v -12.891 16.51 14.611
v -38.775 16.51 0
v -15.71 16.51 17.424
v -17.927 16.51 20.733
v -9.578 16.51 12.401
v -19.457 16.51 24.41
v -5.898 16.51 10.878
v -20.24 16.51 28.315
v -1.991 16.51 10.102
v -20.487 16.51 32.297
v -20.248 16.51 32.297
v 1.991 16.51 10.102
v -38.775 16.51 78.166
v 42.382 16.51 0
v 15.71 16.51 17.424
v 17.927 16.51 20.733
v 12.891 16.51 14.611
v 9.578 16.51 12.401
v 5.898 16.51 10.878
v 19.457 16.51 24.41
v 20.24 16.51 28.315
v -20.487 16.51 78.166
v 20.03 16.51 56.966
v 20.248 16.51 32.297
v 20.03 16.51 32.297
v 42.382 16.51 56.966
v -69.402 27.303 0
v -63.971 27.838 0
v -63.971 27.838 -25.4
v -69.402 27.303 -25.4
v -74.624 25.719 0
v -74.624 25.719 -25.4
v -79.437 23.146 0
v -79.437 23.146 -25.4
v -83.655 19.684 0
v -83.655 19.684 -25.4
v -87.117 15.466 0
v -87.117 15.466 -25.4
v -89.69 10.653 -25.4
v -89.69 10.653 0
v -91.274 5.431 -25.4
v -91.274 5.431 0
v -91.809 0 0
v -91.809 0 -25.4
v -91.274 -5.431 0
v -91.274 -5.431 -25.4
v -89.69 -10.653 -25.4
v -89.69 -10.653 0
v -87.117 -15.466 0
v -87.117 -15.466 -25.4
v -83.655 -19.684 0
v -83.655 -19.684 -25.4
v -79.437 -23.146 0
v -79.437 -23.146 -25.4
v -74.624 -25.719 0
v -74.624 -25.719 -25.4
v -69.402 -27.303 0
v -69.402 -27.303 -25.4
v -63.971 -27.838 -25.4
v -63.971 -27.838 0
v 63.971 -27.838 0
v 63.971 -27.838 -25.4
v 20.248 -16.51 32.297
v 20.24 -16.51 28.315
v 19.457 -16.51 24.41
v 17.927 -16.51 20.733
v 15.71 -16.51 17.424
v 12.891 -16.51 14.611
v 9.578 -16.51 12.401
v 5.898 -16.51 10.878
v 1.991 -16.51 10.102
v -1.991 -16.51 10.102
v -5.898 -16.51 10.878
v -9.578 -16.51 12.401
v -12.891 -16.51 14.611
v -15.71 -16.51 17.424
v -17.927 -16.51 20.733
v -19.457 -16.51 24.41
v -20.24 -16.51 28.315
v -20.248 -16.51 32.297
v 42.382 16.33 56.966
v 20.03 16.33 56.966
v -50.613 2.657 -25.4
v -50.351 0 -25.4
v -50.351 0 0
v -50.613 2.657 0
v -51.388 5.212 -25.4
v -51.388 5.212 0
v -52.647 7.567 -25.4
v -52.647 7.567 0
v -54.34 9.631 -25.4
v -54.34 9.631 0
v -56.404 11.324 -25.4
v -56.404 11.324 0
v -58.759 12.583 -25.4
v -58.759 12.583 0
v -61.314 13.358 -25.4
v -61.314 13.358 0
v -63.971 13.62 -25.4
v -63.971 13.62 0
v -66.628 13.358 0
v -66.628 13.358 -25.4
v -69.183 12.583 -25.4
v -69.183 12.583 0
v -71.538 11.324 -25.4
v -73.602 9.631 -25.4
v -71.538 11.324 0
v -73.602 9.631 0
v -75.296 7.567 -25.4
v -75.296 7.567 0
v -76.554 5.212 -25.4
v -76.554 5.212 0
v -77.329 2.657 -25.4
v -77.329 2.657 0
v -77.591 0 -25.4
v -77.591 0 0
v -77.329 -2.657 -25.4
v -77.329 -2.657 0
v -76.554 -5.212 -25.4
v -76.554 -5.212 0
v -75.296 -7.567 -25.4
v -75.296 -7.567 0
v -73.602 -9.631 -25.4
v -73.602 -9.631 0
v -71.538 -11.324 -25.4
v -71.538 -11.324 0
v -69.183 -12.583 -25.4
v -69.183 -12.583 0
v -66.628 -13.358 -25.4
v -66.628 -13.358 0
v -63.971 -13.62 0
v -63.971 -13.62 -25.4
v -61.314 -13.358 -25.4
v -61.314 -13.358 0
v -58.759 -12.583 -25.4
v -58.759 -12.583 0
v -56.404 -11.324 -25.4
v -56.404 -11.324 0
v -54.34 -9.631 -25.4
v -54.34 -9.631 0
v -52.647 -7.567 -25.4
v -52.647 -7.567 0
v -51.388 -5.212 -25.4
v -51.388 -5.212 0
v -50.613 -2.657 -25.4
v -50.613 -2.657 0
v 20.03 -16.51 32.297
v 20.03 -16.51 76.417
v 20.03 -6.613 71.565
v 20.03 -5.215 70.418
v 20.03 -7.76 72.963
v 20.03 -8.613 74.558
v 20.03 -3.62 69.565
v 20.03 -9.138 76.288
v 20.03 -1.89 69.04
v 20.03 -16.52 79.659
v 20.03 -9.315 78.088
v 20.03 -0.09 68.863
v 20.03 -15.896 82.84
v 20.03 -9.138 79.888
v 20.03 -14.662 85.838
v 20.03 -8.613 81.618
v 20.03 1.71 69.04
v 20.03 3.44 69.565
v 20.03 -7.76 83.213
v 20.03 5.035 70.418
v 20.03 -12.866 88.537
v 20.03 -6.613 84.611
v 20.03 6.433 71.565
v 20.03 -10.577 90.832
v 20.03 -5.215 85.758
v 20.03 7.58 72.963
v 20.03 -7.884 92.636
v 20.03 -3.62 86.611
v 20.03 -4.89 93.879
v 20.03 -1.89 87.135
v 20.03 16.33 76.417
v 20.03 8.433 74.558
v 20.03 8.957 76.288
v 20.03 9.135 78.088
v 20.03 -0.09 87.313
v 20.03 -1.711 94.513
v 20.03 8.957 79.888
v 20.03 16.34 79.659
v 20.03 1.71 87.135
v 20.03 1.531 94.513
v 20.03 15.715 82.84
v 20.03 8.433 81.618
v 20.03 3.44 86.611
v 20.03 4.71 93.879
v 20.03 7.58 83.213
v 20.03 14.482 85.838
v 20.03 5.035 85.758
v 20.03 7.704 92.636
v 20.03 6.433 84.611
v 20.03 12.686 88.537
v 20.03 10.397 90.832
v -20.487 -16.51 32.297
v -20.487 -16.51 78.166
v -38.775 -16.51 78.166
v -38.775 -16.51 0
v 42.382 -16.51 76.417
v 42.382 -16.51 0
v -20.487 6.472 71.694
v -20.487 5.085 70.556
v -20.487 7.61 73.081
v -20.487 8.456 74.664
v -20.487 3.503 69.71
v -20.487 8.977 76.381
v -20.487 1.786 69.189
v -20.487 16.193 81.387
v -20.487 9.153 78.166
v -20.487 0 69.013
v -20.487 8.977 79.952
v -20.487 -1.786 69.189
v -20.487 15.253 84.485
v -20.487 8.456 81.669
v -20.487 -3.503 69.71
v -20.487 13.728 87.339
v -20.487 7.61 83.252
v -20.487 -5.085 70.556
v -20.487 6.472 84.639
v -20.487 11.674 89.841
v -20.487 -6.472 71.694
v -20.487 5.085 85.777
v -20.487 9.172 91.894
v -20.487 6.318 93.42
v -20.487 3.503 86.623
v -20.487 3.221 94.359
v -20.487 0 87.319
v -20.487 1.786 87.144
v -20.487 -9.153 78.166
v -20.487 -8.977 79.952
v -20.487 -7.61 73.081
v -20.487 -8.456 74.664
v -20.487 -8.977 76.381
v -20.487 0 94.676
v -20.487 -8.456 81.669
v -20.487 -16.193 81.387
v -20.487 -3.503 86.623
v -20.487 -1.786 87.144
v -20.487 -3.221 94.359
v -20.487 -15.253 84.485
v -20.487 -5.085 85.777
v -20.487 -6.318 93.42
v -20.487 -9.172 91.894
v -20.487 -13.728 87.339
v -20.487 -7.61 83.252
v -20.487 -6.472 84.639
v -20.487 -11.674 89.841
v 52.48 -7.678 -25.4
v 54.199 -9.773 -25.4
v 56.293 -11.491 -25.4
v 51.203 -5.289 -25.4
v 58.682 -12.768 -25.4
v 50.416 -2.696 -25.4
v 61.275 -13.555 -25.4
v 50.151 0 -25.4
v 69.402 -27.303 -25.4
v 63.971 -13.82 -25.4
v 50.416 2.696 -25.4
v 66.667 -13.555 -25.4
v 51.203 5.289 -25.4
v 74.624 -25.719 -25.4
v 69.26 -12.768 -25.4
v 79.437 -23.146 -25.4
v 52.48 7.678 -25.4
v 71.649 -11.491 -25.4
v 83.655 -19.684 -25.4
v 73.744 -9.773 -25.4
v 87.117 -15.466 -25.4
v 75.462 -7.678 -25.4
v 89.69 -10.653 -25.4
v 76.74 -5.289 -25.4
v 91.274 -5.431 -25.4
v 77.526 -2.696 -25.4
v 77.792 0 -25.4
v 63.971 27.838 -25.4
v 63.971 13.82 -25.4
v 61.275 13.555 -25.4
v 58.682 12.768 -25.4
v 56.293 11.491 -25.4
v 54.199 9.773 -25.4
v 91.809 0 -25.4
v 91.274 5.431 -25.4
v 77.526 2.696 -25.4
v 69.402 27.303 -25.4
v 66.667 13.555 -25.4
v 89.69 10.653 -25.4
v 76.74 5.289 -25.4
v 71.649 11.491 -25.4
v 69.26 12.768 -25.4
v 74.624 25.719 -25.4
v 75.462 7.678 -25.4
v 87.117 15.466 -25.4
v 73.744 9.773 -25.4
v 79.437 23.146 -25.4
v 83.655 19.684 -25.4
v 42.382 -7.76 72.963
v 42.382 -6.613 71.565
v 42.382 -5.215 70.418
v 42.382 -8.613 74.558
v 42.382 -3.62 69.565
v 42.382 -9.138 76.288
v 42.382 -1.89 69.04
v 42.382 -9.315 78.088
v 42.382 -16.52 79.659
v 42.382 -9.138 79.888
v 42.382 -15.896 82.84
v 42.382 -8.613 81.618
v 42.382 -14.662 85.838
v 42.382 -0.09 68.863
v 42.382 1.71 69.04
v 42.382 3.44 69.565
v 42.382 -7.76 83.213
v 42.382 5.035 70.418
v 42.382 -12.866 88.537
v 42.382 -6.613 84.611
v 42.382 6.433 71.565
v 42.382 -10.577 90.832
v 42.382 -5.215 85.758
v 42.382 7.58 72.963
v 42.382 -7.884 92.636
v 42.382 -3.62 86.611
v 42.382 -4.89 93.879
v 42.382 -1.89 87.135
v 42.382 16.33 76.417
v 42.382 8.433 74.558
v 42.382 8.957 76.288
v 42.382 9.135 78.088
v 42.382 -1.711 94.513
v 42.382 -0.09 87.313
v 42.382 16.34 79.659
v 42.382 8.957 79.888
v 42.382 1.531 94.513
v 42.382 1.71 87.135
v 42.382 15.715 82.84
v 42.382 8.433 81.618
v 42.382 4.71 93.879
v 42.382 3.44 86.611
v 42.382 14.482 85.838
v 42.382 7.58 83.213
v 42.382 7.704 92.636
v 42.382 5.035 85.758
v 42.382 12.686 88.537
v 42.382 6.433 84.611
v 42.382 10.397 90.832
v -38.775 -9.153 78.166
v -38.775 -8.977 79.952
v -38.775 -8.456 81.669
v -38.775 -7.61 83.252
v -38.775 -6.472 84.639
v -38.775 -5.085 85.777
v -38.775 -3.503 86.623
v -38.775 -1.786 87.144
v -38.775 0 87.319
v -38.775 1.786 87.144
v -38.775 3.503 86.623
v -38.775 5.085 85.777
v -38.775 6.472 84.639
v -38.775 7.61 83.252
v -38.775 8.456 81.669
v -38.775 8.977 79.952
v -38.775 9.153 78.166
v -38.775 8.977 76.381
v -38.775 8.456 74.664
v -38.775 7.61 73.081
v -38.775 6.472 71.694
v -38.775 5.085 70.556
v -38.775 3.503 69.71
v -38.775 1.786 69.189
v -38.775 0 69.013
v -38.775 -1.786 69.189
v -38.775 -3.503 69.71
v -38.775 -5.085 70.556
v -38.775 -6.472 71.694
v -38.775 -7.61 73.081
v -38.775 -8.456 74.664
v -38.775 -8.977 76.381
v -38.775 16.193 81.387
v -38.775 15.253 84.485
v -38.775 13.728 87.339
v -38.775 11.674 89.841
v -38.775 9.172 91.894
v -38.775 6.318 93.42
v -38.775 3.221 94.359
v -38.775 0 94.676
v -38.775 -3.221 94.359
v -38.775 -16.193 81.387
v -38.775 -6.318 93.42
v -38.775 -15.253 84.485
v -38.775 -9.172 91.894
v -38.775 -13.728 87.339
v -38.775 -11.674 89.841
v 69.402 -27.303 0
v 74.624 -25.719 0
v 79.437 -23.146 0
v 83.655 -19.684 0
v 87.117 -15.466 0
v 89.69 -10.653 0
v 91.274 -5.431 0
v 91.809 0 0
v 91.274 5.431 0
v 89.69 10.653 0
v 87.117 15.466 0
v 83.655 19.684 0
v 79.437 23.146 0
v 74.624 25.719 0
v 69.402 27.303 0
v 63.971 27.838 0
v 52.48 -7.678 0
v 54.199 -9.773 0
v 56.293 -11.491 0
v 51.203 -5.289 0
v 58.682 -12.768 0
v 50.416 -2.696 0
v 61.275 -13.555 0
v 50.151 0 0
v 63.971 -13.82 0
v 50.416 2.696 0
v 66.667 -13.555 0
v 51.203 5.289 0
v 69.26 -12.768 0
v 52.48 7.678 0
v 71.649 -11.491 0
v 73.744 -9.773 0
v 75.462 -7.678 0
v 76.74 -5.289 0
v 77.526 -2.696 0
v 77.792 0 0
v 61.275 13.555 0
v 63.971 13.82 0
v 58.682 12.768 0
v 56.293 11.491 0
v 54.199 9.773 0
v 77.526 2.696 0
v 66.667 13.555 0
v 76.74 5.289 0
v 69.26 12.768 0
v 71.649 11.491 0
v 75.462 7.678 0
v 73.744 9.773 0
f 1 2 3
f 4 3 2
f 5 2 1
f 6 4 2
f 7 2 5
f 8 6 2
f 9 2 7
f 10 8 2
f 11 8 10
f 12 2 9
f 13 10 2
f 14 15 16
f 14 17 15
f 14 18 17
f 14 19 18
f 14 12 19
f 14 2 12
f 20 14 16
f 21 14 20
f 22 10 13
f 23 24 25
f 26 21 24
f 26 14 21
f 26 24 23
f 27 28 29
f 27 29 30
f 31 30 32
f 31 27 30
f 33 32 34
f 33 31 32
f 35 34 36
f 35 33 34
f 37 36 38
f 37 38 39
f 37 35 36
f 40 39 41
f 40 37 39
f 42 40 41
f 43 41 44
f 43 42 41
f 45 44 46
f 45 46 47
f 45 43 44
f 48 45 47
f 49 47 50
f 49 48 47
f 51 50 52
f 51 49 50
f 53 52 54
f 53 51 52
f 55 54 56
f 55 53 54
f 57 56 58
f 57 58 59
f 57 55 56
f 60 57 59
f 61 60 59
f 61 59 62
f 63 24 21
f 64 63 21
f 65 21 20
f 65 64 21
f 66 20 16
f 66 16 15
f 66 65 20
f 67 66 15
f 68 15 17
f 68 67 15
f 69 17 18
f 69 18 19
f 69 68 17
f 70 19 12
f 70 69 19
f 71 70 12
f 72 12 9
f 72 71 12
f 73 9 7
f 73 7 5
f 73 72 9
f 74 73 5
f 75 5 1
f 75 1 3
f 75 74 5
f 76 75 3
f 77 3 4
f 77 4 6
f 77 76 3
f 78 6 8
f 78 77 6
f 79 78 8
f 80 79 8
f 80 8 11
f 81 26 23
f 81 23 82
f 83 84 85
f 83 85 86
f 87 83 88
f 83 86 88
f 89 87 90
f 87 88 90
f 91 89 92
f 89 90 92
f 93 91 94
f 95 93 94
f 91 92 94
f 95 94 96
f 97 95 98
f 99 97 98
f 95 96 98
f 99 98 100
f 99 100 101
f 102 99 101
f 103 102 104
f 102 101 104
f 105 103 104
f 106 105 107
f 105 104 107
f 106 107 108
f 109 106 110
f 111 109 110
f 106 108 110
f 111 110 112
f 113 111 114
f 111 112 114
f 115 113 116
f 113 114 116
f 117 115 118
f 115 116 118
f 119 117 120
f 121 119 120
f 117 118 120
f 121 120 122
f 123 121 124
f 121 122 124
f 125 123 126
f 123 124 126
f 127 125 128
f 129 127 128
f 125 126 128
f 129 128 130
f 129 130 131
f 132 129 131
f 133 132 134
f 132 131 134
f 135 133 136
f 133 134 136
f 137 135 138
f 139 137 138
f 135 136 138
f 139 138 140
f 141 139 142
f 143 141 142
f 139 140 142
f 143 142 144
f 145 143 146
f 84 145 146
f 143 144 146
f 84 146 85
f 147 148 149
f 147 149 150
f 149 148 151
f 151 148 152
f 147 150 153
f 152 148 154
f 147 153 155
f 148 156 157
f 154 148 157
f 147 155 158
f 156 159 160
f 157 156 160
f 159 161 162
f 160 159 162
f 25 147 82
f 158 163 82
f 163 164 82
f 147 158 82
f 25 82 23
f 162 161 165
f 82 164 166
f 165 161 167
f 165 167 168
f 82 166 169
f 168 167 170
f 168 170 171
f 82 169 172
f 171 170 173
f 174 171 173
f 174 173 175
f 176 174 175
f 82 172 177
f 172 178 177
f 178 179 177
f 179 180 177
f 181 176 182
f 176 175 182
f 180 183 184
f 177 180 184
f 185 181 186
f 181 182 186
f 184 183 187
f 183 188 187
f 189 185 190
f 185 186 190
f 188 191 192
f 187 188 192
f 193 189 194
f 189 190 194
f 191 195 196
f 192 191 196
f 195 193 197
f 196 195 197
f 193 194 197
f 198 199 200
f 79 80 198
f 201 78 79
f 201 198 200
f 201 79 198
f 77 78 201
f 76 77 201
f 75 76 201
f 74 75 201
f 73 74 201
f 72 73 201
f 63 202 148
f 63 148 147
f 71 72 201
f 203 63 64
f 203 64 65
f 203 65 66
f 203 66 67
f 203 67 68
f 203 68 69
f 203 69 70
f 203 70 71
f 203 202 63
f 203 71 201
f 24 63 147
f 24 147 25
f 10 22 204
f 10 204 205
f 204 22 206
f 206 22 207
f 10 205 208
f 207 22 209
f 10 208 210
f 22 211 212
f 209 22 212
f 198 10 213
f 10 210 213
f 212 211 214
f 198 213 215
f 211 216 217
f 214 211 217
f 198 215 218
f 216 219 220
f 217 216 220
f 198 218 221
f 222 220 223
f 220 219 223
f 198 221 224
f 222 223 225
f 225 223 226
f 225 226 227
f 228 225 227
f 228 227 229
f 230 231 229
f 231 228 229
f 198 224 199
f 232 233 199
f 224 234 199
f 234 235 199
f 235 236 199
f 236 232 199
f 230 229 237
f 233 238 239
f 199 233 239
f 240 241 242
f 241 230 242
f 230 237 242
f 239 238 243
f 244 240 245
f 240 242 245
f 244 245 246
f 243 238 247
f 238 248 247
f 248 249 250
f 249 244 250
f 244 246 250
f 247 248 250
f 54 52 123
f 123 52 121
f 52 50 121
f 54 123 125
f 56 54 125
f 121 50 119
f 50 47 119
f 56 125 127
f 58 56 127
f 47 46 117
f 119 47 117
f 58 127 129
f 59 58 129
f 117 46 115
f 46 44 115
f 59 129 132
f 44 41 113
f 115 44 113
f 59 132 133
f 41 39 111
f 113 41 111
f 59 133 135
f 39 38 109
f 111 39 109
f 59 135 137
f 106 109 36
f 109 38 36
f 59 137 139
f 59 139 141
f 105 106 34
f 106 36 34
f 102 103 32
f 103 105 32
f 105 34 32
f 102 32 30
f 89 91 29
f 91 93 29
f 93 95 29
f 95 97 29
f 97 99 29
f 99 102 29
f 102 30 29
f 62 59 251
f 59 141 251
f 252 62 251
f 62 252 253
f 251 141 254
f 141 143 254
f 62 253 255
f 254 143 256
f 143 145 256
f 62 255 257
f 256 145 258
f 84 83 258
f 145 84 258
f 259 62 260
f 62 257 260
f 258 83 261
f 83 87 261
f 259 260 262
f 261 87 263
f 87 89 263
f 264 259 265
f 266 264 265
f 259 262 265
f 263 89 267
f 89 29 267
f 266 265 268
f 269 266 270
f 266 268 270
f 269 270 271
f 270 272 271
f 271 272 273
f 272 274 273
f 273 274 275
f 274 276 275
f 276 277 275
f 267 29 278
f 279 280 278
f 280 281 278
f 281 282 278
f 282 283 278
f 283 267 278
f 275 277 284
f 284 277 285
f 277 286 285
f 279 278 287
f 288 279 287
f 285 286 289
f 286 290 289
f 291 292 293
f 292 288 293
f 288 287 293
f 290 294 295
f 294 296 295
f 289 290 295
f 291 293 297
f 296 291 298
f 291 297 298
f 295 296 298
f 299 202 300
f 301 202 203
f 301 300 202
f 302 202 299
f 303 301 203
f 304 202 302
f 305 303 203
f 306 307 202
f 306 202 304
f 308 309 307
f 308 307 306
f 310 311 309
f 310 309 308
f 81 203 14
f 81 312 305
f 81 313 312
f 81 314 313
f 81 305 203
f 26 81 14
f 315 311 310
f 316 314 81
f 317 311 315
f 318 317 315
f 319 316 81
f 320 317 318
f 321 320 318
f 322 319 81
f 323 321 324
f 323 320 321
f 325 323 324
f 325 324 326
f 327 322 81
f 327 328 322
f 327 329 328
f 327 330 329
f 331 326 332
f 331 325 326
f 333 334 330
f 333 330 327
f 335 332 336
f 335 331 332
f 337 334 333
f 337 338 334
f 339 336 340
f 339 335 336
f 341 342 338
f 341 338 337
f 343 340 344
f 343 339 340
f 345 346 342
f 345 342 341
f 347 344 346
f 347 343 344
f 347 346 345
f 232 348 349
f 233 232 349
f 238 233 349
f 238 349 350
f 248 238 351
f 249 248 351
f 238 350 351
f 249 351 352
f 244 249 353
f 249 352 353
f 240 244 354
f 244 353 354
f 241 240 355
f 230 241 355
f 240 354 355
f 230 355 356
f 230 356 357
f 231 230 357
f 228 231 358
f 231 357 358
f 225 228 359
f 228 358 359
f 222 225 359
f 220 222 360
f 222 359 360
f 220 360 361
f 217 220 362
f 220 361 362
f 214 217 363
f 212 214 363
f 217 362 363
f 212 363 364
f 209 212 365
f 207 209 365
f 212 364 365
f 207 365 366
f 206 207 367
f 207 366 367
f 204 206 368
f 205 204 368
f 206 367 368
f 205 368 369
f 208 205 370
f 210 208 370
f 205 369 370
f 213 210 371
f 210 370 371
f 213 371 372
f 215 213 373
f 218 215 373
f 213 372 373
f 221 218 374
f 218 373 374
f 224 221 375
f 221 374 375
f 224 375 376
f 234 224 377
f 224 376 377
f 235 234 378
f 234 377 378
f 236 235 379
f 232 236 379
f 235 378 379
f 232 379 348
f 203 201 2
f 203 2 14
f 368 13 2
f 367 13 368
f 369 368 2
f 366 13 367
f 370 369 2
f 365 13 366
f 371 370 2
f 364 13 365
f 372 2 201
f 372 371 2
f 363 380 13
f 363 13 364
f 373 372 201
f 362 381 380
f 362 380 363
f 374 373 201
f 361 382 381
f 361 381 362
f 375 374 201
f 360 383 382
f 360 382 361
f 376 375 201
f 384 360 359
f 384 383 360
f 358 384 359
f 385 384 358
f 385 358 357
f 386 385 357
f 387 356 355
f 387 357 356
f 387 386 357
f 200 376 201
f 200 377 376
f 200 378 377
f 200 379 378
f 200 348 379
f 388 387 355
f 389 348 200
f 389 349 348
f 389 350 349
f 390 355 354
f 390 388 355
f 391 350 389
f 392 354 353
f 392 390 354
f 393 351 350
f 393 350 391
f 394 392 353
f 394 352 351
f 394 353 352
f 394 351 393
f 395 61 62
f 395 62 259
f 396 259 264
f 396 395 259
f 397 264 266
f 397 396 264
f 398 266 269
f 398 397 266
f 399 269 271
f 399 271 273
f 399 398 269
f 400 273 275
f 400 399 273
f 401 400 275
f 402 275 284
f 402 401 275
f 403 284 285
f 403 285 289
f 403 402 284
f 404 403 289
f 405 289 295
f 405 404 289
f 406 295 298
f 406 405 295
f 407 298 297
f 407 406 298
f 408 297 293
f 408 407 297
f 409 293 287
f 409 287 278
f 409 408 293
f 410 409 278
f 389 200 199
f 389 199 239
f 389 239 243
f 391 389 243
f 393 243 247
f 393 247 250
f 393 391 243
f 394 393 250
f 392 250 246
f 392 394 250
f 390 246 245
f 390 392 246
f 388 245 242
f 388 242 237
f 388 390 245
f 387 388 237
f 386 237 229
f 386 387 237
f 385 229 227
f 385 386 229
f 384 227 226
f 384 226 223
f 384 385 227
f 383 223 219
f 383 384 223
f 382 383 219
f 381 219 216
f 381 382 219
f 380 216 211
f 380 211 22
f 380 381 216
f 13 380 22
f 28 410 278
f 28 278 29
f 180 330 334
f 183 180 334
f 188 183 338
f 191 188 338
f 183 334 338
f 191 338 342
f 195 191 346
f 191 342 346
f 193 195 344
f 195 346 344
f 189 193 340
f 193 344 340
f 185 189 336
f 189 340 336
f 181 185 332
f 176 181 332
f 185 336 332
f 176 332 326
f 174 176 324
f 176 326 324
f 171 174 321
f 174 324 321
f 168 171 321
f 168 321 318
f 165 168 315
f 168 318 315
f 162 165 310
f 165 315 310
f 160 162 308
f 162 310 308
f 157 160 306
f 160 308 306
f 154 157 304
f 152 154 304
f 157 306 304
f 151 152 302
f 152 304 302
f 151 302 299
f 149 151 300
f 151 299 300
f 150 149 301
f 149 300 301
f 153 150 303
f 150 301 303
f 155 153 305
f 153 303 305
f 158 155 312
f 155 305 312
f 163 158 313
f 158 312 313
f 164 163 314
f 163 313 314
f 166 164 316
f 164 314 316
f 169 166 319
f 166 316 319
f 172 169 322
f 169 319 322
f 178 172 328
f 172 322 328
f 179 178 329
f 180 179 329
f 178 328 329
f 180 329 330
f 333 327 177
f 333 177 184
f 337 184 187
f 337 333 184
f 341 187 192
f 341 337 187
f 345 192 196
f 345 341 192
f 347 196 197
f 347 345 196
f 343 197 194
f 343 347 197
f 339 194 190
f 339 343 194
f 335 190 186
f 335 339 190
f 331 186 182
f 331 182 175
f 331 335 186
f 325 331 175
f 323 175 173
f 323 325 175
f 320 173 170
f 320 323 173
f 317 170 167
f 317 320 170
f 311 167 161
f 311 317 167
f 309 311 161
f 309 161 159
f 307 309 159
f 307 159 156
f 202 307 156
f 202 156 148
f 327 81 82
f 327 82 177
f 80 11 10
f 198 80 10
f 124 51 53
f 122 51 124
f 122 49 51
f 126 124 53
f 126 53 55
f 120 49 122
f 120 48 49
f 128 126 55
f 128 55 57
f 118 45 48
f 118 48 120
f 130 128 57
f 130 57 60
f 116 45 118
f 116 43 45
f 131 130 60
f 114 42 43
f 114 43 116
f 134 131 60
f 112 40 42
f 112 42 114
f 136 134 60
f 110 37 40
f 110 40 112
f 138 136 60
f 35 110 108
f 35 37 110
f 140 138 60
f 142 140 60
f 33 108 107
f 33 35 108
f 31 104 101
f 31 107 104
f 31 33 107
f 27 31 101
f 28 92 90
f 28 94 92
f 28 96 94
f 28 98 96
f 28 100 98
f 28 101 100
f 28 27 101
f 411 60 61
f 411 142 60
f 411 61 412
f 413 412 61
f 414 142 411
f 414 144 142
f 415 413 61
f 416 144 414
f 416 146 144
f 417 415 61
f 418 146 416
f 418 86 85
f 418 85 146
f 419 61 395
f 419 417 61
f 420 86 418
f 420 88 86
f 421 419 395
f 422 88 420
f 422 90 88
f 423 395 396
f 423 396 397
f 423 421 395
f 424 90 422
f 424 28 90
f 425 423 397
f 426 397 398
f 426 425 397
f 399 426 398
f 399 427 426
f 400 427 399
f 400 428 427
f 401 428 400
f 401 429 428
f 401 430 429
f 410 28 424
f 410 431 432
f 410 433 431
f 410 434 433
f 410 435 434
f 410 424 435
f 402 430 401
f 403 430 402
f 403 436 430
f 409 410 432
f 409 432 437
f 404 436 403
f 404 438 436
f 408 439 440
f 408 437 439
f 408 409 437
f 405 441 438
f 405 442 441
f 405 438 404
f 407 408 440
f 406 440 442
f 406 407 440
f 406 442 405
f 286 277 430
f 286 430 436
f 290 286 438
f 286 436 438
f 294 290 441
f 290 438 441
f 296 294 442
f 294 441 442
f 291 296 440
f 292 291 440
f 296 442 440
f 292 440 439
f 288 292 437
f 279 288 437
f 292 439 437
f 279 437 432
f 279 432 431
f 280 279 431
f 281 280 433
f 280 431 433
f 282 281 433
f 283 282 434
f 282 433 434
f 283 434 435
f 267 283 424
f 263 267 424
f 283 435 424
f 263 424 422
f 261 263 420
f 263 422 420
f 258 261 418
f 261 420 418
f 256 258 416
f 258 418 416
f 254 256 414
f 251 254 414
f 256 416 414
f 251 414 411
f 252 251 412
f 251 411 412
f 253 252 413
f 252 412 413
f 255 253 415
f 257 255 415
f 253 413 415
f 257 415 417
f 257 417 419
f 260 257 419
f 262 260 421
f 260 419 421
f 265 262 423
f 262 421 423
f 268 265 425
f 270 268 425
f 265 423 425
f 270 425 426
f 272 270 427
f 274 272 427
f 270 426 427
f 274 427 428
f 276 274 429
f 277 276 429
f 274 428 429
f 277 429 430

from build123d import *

# Parameters (mm, degrees)
F0_R     = 13.6198201134
F0_R_2   = 13.8204624453
F1_DEPTH = 25.4
F3_DEPTH = 16.51
F4_R     = 9.1529854274
F5_DEPTH = 18.288
F6_R     = 9.2248596532
F7_DEPTH = 22.352


# Not quite as in the source:
# - a feature names something its author has since deleted; it is built from what else it names


with BuildPart() as f1:
    # F0 (on Top) → F1 (new body)
    with BuildSketch(Plane.XY):
        with BuildLine():
            Line((-63.97113204, -27.8375800699), (63.97113204, -27.8375800699))
            ThreePointArc((63.97113204, -27.8375800699), (91.8087121099, 0), (63.97113204, 27.8375800699))
            Line((63.97113204, 27.8375800699), (-63.97113204, 27.8375800699))
            ThreePointArc((-63.97113204, 27.8375800699), (-91.8087121099, 0), (-63.97113204, -27.8375800699))
        make_face()
        with Locations((-63.97113204, 0)):
            Circle(F0_R, mode=Mode.SUBTRACT)
        with Locations((63.97113204, 0)):
            Circle(F0_R_2, mode=Mode.SUBTRACT)
    extrude(amount=-F1_DEPTH)


with BuildPart() as f3:
    # F2 (on Front) → F3 (new body, symmetric)
    with BuildSketch(Plane.XZ):
        with BuildLine():
            Line((-38.7753397226, 32.2974100709), (-38.7753397226, 0))
            Line((-38.7753397226, 0), (42.3823483288, 0))
            Line((42.3823483288, 0), (42.3823483288, 32.2974100709))
            Line((42.3823483288, 32.2974100709), (20.2484317124, 32.2974100709))
            ThreePointArc((20.2484317124, 32.2974100709), (0, 10.0047543374), (-20.2484317124, 32.2974100709))
            Line((-20.2484317124, 32.2974100709), (-38.7753397226, 32.2974100709))
        make_face()
    extrude(amount=F3_DEPTH, both=True)

    # F4 (on face) → F5 (join)
    with BuildSketch(Plane(origin=(-38.7753397226, 0, 0), x_dir=(0, -1, 0), z_dir=(-1, 0, 0))):
        with BuildLine():
            Line((-16.51, 78.1664475799), (-16.51, 56.965649128))
            Line((-16.51, 56.965649128), (-16.51, 32.2974100709))
            Line((-16.51, 32.2974100709), (16.51, 32.2974100709))
            Line((16.51, 32.2974100709), (16.51, 56.965649128))
            Line((16.51, 56.965649128), (16.51, 78.1664475799))
            ThreePointArc((16.51, 78.1664475799), (0, 94.6764475799), (-16.51, 78.1664475799))
        make_face()
        with Locations((0, 78.1664475799)):
            Circle(F4_R, mode=Mode.SUBTRACT)
    extrude(amount=-F5_DEPTH)

    # F6 (on face) → F7 (join)
    with BuildSketch(Plane.YZ.offset(42.3823483288)):
        with BuildLine():
            Line((-16.51, 76.4174684882), (-16.51, 56.965649128))
            Line((-16.51, 56.965649128), (-16.51, 32.2974100709))
            Line((-16.51, 32.2974100709), (16.51, 32.2974100709))
            Line((16.51, 32.2974100709), (16.51, 56.965649128))
            Line((16.51, 56.965649128), (16.3297262043, 56.965649128))
            Line((16.3297262043, 56.965649128), (16.3297262043, 76.4174684882))
            ThreePointArc((16.3297262043, 76.4174684882), (-0.0901368979, 94.5924619413), (-16.51, 76.4174684882))
        make_face()
        with Locations((-0.0901368979, 78.0878537591)):
            Circle(F6_R, mode=Mode.SUBTRACT)
    extrude(amount=-F7_DEPTH)


solid = Compound([f1.part, f3.part])
